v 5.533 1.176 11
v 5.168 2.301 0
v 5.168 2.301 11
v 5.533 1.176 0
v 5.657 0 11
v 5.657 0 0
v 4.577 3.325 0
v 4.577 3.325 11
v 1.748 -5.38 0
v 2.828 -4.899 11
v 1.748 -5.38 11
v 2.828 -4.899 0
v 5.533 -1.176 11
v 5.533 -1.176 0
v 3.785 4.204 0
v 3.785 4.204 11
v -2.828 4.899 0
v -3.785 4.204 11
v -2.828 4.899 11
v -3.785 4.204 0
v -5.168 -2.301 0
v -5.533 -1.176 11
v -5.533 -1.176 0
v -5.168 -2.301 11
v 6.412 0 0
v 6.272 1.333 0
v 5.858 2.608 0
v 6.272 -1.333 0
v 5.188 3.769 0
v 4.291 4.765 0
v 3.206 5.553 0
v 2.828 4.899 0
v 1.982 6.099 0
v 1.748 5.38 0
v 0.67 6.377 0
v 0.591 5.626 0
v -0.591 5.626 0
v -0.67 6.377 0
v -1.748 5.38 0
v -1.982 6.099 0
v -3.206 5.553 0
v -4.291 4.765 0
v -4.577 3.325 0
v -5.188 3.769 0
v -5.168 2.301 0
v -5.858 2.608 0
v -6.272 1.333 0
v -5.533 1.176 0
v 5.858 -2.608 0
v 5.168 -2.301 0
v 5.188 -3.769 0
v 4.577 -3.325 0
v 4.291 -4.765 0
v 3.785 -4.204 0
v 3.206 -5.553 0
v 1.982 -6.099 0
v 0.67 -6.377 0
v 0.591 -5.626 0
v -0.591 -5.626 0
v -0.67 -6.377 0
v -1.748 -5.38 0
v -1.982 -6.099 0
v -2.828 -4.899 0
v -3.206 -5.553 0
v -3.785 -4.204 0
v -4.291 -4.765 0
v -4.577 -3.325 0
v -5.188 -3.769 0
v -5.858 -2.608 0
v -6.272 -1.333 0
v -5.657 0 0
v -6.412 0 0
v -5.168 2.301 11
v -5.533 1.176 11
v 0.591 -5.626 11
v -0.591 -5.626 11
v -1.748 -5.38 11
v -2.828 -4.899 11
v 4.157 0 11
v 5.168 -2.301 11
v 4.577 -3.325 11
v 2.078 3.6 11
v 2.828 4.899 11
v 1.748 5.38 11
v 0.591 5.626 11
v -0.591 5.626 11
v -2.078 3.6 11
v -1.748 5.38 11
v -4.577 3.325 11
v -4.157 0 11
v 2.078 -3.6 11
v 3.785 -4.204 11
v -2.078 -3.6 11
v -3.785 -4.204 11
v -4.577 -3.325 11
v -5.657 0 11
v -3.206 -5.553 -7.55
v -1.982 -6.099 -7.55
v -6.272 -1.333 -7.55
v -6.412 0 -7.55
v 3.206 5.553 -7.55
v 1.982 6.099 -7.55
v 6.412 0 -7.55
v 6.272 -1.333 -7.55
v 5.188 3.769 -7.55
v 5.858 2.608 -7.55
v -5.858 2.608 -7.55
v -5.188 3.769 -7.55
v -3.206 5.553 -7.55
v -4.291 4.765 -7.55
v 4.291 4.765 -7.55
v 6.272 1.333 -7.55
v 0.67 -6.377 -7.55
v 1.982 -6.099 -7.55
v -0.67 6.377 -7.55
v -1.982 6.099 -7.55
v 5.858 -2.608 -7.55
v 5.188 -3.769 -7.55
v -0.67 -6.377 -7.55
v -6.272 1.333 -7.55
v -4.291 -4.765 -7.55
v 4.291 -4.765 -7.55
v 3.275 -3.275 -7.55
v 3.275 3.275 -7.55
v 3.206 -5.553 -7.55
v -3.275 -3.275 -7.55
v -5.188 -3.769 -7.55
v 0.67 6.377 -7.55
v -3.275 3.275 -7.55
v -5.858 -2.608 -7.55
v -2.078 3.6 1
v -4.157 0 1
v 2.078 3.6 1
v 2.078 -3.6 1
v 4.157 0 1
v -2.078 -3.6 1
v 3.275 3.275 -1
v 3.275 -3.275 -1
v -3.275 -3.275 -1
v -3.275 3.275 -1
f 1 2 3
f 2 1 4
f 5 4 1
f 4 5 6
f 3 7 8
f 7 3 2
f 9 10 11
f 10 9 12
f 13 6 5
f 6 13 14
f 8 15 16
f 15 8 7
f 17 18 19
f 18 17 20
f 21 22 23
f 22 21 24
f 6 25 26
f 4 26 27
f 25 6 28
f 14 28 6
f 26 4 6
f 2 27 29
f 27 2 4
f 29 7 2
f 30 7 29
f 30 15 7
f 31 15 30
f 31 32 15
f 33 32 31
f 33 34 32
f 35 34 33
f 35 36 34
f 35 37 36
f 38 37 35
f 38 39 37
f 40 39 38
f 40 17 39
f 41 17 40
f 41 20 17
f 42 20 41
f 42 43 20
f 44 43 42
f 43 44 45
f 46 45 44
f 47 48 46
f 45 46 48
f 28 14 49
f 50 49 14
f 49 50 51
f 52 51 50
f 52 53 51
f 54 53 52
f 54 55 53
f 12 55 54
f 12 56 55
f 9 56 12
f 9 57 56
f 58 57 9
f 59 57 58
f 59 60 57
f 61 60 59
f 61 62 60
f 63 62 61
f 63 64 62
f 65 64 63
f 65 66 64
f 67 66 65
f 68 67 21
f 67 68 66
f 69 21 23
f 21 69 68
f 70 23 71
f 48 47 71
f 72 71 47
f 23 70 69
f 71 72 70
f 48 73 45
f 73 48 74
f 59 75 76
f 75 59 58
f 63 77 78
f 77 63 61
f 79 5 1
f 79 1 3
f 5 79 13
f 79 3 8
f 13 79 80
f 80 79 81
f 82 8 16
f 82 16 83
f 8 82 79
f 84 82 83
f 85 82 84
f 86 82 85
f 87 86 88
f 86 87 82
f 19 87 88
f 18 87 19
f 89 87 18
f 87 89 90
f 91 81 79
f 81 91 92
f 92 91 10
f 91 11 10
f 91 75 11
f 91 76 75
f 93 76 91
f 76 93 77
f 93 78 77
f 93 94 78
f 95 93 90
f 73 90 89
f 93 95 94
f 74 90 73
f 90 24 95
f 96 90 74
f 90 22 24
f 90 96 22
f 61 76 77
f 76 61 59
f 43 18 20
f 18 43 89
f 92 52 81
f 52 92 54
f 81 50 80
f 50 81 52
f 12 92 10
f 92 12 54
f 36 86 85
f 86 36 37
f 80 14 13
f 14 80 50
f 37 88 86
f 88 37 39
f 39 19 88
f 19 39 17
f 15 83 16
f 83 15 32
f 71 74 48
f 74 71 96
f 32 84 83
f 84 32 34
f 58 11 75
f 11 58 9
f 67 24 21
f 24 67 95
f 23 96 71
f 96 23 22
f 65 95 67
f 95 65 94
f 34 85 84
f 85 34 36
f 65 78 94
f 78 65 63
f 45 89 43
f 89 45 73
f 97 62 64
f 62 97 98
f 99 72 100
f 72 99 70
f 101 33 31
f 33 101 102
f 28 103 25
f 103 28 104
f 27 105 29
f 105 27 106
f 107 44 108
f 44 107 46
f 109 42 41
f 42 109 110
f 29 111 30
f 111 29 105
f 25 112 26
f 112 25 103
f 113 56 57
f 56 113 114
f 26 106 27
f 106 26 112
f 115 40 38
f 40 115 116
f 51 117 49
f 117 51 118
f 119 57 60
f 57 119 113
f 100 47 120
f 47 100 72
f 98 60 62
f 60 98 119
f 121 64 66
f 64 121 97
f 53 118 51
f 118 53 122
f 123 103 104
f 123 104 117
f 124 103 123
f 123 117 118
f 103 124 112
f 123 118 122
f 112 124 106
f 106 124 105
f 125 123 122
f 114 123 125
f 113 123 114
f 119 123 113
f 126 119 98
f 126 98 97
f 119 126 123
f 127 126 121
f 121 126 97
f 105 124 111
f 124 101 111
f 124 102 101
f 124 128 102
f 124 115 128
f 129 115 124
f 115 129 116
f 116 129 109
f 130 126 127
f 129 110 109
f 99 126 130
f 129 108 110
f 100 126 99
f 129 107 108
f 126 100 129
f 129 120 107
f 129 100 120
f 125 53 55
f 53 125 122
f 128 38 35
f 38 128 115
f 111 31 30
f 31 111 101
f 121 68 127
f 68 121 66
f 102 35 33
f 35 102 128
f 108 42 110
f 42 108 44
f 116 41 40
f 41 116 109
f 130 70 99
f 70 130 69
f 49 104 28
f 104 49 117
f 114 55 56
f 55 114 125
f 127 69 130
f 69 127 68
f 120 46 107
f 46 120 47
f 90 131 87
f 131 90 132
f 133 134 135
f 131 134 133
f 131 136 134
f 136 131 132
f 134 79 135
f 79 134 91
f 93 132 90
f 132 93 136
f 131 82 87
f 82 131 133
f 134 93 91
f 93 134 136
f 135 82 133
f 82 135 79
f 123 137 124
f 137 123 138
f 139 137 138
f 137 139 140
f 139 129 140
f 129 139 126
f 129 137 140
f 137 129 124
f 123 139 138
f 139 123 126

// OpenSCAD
// [FL_INDEX: keywords="openscad, 3d_parametric, Parametric_hex_socket, csg_solid" | COT="Parametric OpenSCAD design from 3DCodeverse"]
// Title: Parametric hex socket

//Hex socket (customizable)

// diameter of hole across-flats
size = 7;
// size of drive
drive = 6.35; // [6.35:1/4", 9.525:3/8", 12.7:1/2", 19.05:3/4", 25.4:1"]
// depth of socket
depth = 10;
// drive and socket size tolerance
tolerance = 0.2;

tolSize = size + tolerance;
inscribedSize = tolSize/0.866025;
tolDrive = drive + tolerance;

socketRadius = (inscribedSize+3)/2;
driveRadius = ((tolDrive*1.5)+3)/2;

difference()
{
	union()
	{
		//socket portion
		translate([0,0,(depth+1)/2])
		cylinder(h = depth + 1, r = socketRadius, center = true, $fn = 30);

		//drive portion
		translate([0,0,0-((tolDrive + 1) / 2)])
		cylinder(h = tolDrive + 1, r = driveRadius, center = true, $fn = 30);
	}
	
	//socket hole
	translate([0,0,1])
	linear_extrude(height = depth, center = false)
	circle(r = inscribedSize/2, $fn = 6);

	//drive hole
	translate([0,0,0-(tolDrive/2)-1])
	cube(size = tolDrive, center = true);
}
